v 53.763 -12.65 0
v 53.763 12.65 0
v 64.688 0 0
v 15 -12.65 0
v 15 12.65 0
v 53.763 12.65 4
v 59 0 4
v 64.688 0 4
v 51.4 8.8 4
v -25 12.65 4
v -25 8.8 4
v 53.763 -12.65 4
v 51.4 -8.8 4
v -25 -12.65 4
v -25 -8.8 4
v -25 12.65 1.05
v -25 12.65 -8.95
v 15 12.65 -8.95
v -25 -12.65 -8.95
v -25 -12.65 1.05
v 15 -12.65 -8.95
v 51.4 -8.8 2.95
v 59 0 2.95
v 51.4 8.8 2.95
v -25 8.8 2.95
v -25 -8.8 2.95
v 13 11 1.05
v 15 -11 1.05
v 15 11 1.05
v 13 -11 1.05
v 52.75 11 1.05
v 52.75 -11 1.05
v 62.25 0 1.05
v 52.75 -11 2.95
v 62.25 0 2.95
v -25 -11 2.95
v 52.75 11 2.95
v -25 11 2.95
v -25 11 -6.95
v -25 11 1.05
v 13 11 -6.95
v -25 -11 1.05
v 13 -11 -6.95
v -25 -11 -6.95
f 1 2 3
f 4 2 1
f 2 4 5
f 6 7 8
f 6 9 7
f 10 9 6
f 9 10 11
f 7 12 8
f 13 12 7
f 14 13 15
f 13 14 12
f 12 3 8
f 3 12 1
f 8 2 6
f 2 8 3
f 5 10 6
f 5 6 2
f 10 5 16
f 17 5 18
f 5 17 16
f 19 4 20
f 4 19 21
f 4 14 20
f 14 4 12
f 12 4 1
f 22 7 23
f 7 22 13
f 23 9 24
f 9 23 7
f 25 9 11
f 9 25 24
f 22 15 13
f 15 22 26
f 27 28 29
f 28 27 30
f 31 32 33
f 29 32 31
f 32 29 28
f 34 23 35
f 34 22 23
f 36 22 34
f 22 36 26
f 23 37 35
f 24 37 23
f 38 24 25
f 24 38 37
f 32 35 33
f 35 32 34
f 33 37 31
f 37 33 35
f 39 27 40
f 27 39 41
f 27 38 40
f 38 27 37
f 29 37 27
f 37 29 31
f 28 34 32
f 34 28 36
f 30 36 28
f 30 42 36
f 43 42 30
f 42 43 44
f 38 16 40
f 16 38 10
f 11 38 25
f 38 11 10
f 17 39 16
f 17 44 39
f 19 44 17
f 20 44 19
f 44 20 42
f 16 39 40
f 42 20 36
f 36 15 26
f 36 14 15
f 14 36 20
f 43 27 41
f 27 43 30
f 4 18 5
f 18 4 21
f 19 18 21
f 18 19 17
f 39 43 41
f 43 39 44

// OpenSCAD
w = 22;
l = 85;
h = 8;

module sensor(w=22, l1=112.5, l2=112.5-9.5)
{
    translate([-l1/2, -w/2])
    polygon(
        points=[[l2, 0], [l1, w/2], [l2, w], [0, 0], [0, w]],
        paths=[[0, 1, 2], [0, 2, 4, 3]], convecity=10
    );
}

module battery(w=22, l=40, h=8)
{
    cube([l, w, h]);
}

color("red" ){
    //translate([6, 0, (4-1.9)/2]) linear_extrude(height = 1.9) sensor();
    //translate([-42, -w/2, -8+(4-1.9)/2]) battery();
}

color("blue", 0.75) {
difference()
{
    linear_extrude(height = 4) scale(1.15) sensor();
    translate([14, 0, 1.9]) linear_extrude(height = 5) scale(0.8) sensor();
    translate([6, 0, (4-1.9)/2]) linear_extrude(height = 1.9) sensor();
    translate([-75, -25.5/2, -w/2])cube([50,25.5,w]);
    translate([-27, -w/2, -h+(4-1.9)/2]) battery();
}
difference()
{
    translate([-25, -25.3/2, -10+(h/2-1.9)/2]) battery(w=25.3, l=40, h=10);
    translate([-27, -w/2, -h+(h/2-1.9)/2]) battery();
}
}
difference()
{
intersection()
{
//    cube([l,w,h+5]);
    union()
    {
    //translate([l, w/2, h]) rotate([0,-90,0]) cylinder(r1=0, r2=w/2, h=10, $fn=100);
    //translate([l-10, w/2, h]) rotate([0,-90,0]) cylinder(r1=w/2, r2=w/2, h=l-h-2, $fn=100);
    }
}
//translate([0, w/2-20/2, 1.75]) cube([40, 20, 8]);
//translate([0, w/2-20/2, 7.5+1.75]) cube([70, 20, 1.75]);
//translate([0, w/2-18/2, 7.5+1.75]) cube([70, 18, 4]);
//translate([70,  w/2-21/2, 7.5+1.75]) linear_extrude(height = 1.75) polygon(points=[[0, 0], [9, 21/2], [0, 21]], paths=[[0, 1, 2]], convecity=10);
//translate([70,  w/2-18/2, 7.5+1.75]) linear_extrude(height = 5) polygon(points=[[0, 0], [8, 18/2], [0, 18]], paths=[[0, 1, 2]], convecity=10);
}
